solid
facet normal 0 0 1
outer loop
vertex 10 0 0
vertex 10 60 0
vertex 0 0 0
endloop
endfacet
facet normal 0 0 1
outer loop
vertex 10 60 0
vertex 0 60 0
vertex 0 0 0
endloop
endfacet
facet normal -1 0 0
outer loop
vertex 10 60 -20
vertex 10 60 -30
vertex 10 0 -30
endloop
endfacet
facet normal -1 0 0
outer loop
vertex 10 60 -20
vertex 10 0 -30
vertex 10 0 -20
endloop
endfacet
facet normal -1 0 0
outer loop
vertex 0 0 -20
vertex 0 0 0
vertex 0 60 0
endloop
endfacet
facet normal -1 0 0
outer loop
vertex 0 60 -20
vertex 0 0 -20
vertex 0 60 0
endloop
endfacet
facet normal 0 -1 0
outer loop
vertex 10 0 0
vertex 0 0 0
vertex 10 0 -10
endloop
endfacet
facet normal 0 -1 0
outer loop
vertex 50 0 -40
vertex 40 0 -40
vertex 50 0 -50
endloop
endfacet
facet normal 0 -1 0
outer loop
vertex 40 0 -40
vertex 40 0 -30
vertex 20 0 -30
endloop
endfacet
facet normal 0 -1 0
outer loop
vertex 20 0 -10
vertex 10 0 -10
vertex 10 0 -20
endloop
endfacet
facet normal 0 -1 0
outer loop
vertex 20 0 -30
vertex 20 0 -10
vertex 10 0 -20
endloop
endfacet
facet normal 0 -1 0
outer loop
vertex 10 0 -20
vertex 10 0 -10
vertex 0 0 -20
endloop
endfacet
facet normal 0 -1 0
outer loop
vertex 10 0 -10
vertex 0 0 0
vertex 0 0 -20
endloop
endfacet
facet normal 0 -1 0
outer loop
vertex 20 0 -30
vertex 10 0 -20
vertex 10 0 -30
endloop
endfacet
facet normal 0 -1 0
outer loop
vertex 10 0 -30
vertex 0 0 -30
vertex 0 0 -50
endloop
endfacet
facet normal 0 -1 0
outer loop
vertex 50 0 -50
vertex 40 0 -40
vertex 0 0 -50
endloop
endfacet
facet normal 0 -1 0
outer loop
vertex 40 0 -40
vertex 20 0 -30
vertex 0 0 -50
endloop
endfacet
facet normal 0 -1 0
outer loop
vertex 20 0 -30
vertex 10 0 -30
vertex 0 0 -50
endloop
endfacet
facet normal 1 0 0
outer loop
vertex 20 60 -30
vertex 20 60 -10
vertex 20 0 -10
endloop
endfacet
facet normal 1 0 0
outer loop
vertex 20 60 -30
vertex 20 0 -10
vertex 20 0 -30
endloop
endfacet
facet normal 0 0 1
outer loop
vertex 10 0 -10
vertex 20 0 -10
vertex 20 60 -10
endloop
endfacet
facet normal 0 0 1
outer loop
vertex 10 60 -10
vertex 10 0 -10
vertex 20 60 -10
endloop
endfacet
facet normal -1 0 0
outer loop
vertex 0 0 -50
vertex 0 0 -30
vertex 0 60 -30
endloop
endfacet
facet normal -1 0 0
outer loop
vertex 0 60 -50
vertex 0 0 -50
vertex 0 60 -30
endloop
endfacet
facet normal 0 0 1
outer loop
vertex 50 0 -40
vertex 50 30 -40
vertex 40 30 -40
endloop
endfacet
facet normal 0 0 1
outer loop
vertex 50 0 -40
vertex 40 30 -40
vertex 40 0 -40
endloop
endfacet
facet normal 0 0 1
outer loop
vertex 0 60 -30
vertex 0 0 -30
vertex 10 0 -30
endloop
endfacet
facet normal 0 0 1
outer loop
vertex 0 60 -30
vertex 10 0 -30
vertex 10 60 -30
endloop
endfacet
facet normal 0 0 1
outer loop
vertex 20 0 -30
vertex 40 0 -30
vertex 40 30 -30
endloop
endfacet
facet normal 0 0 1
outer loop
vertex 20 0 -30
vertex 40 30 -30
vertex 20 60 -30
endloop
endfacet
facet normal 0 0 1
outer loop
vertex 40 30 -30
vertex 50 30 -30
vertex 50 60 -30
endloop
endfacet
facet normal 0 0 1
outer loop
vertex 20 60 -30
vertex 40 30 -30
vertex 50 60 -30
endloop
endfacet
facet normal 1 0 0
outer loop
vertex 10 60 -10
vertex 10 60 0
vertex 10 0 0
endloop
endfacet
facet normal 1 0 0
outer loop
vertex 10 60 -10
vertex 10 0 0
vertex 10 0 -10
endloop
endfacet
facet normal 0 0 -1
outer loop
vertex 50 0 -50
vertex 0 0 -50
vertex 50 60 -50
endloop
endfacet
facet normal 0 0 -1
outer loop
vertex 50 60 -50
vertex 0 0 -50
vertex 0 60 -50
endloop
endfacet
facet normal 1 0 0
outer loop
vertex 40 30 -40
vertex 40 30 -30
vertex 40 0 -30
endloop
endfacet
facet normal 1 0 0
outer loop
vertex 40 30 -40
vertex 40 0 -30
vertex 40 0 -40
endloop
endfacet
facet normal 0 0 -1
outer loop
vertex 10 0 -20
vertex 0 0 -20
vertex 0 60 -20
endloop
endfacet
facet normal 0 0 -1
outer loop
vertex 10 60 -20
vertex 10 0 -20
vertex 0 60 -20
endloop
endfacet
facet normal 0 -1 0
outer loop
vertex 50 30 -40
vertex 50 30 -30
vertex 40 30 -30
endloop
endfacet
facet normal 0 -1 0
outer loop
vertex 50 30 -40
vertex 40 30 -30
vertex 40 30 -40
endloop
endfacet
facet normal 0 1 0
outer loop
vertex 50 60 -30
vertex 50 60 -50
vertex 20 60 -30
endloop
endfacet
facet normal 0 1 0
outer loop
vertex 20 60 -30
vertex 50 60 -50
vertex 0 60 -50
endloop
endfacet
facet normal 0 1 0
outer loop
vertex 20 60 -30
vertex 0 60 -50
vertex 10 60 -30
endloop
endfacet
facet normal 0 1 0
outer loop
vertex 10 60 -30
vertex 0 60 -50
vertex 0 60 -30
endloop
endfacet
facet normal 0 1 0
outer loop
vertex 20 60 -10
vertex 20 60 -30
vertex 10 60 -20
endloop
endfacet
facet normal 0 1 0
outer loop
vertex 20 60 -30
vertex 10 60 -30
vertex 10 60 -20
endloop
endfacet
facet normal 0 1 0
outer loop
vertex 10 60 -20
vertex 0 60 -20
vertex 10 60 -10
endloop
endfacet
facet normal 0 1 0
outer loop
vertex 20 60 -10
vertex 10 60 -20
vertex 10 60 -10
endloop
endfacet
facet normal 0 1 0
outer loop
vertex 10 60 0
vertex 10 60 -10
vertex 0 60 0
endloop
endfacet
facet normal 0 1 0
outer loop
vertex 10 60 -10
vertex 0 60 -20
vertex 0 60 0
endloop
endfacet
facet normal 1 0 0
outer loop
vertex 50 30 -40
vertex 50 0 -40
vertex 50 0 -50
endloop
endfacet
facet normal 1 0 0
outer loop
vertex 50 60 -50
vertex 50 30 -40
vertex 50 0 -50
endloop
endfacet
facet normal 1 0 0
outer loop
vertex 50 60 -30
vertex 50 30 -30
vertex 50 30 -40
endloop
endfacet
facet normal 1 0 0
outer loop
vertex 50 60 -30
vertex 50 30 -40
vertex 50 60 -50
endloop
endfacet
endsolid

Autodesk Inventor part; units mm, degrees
ref_plane "YZ Plane" through (0, 0, 0) normal (1, 0, 0) x (0, 1, 0)
ref_plane "XZ Plane" through (0, 0, 0) normal (0, 1, 0) x (-1, 0, 0)
ref_plane "XY Plane" through (0, 0, 0) normal (0, 0, 1) x (1, 0, 0)
sketch "Náčrt1" plane through (0, 0, 0) normal (1, 0, 0) x (0, 1, 0)
  line L0 (0, 0) -> (0, -50)
  line L1 (0, -50) -> (60, -50)
  line L2 (60, -50) -> (60, 0)
  line L3 (60, 0) -> (0, 0)
  dimension "d0" = 50
  dimension "d1" = 60
extrude "Vysunutí1" add sketch "Náčrt1" along normal blind 50
sketch "Náčrt2" plane through (50, 0, 0) normal (1, 0, 0) x (0, 0, -1)
  line L0 (50, 0) -> (50, 60) projected
  line L1 (50, 60) -> (50, 30)
  line L2 (50, 30) -> (40, 30)
  line L3 (40, 30) -> (40, 0)
  line L4 (0, 0) -> (50, 0) projected
  line L5 (40, 0) -> (30, 0)
  line L6 (30, 0) -> (30, 30)
  line L7 (30, 30) -> (40, 30)
  dimension "d4" = 30
  dimension "d5" = 10
  dimension "d6" = 10
extrude "Vysunutí2" cut sketch "Náčrt2" against normal blind 10 contours L4 L6 L7 L3
sketch "Náčrt3" plane through (50, 0, 0) normal (1, 0, 0) x (0, 0, -1)
  point P0 (0, 0)
sketch "Náčrt4" plane through (50, 0, 0) normal (1, 0, 0) x (0, 0, -1)
  line L0 (0, 0) -> (30, 0) projected
  line L1 (0, 0) -> (30, 0)
  line L2 (30, 0) -> (30, 60)
  line L3 (50, 60) -> (0, 60) projected
  line L4 (0, 60) -> (0, 0) projected
  line L5 (30, 60) -> (0, 60)
  line L6 (0, 60) -> (0, 0)
  dimension "d9" = 30
extrude "Vysunutí3" cut sketch "Náčrt4" against normal blind 30
sketch "Náčrt5" plane through (20, 0, 0) normal (1, 0, 0) x (0, 0, -1)
  line L0 (30, 0) -> (0, 0) projected
  line L1 (0, 0) -> (10, 0)
  line L2 (10, 0) -> (10, 60)
  line L3 (50, 60) -> (0, 60) projected
  line L4 (0, 60) -> (0, 0) projected
  line L5 (0, 60) -> (10, 60)
  line L6 (0, 60) -> (0, 0)
  dimension "d12" = 10
extrude "Vysunutí4" cut sketch "Náčrt5" against normal blind 10
sketch "Náčrt6" plane through (0, 0, 0) normal (-1, 0, 0) x (0, 0, 1)
  line L0 (-50, 60) -> (0, 60) projected
  line L1 (0, 60) -> (-20, 60)
  line L2 (-30, 60) -> (-30, 30) projected
  line L3 (-20, 60) -> (-30, 60)
  line L4 (-30, 0) -> (-30, 30) projected
  line L5 (-30, 60) -> (-30, 0)
  line L6 (-30, 0) -> (-20, 0)
  line L7 (-30, 0) -> (-10, 0) projected
  line L8 (-20, 0) -> (-20, 60)
  point P0 (0, 0)
  dimension "d15" = 20
  dimension "d16" = 10
extrude "Vysunutí5" cut sketch "Náčrt6" against normal blind 10
properties part number "Martin-Probst-26673_obrazek_3"
